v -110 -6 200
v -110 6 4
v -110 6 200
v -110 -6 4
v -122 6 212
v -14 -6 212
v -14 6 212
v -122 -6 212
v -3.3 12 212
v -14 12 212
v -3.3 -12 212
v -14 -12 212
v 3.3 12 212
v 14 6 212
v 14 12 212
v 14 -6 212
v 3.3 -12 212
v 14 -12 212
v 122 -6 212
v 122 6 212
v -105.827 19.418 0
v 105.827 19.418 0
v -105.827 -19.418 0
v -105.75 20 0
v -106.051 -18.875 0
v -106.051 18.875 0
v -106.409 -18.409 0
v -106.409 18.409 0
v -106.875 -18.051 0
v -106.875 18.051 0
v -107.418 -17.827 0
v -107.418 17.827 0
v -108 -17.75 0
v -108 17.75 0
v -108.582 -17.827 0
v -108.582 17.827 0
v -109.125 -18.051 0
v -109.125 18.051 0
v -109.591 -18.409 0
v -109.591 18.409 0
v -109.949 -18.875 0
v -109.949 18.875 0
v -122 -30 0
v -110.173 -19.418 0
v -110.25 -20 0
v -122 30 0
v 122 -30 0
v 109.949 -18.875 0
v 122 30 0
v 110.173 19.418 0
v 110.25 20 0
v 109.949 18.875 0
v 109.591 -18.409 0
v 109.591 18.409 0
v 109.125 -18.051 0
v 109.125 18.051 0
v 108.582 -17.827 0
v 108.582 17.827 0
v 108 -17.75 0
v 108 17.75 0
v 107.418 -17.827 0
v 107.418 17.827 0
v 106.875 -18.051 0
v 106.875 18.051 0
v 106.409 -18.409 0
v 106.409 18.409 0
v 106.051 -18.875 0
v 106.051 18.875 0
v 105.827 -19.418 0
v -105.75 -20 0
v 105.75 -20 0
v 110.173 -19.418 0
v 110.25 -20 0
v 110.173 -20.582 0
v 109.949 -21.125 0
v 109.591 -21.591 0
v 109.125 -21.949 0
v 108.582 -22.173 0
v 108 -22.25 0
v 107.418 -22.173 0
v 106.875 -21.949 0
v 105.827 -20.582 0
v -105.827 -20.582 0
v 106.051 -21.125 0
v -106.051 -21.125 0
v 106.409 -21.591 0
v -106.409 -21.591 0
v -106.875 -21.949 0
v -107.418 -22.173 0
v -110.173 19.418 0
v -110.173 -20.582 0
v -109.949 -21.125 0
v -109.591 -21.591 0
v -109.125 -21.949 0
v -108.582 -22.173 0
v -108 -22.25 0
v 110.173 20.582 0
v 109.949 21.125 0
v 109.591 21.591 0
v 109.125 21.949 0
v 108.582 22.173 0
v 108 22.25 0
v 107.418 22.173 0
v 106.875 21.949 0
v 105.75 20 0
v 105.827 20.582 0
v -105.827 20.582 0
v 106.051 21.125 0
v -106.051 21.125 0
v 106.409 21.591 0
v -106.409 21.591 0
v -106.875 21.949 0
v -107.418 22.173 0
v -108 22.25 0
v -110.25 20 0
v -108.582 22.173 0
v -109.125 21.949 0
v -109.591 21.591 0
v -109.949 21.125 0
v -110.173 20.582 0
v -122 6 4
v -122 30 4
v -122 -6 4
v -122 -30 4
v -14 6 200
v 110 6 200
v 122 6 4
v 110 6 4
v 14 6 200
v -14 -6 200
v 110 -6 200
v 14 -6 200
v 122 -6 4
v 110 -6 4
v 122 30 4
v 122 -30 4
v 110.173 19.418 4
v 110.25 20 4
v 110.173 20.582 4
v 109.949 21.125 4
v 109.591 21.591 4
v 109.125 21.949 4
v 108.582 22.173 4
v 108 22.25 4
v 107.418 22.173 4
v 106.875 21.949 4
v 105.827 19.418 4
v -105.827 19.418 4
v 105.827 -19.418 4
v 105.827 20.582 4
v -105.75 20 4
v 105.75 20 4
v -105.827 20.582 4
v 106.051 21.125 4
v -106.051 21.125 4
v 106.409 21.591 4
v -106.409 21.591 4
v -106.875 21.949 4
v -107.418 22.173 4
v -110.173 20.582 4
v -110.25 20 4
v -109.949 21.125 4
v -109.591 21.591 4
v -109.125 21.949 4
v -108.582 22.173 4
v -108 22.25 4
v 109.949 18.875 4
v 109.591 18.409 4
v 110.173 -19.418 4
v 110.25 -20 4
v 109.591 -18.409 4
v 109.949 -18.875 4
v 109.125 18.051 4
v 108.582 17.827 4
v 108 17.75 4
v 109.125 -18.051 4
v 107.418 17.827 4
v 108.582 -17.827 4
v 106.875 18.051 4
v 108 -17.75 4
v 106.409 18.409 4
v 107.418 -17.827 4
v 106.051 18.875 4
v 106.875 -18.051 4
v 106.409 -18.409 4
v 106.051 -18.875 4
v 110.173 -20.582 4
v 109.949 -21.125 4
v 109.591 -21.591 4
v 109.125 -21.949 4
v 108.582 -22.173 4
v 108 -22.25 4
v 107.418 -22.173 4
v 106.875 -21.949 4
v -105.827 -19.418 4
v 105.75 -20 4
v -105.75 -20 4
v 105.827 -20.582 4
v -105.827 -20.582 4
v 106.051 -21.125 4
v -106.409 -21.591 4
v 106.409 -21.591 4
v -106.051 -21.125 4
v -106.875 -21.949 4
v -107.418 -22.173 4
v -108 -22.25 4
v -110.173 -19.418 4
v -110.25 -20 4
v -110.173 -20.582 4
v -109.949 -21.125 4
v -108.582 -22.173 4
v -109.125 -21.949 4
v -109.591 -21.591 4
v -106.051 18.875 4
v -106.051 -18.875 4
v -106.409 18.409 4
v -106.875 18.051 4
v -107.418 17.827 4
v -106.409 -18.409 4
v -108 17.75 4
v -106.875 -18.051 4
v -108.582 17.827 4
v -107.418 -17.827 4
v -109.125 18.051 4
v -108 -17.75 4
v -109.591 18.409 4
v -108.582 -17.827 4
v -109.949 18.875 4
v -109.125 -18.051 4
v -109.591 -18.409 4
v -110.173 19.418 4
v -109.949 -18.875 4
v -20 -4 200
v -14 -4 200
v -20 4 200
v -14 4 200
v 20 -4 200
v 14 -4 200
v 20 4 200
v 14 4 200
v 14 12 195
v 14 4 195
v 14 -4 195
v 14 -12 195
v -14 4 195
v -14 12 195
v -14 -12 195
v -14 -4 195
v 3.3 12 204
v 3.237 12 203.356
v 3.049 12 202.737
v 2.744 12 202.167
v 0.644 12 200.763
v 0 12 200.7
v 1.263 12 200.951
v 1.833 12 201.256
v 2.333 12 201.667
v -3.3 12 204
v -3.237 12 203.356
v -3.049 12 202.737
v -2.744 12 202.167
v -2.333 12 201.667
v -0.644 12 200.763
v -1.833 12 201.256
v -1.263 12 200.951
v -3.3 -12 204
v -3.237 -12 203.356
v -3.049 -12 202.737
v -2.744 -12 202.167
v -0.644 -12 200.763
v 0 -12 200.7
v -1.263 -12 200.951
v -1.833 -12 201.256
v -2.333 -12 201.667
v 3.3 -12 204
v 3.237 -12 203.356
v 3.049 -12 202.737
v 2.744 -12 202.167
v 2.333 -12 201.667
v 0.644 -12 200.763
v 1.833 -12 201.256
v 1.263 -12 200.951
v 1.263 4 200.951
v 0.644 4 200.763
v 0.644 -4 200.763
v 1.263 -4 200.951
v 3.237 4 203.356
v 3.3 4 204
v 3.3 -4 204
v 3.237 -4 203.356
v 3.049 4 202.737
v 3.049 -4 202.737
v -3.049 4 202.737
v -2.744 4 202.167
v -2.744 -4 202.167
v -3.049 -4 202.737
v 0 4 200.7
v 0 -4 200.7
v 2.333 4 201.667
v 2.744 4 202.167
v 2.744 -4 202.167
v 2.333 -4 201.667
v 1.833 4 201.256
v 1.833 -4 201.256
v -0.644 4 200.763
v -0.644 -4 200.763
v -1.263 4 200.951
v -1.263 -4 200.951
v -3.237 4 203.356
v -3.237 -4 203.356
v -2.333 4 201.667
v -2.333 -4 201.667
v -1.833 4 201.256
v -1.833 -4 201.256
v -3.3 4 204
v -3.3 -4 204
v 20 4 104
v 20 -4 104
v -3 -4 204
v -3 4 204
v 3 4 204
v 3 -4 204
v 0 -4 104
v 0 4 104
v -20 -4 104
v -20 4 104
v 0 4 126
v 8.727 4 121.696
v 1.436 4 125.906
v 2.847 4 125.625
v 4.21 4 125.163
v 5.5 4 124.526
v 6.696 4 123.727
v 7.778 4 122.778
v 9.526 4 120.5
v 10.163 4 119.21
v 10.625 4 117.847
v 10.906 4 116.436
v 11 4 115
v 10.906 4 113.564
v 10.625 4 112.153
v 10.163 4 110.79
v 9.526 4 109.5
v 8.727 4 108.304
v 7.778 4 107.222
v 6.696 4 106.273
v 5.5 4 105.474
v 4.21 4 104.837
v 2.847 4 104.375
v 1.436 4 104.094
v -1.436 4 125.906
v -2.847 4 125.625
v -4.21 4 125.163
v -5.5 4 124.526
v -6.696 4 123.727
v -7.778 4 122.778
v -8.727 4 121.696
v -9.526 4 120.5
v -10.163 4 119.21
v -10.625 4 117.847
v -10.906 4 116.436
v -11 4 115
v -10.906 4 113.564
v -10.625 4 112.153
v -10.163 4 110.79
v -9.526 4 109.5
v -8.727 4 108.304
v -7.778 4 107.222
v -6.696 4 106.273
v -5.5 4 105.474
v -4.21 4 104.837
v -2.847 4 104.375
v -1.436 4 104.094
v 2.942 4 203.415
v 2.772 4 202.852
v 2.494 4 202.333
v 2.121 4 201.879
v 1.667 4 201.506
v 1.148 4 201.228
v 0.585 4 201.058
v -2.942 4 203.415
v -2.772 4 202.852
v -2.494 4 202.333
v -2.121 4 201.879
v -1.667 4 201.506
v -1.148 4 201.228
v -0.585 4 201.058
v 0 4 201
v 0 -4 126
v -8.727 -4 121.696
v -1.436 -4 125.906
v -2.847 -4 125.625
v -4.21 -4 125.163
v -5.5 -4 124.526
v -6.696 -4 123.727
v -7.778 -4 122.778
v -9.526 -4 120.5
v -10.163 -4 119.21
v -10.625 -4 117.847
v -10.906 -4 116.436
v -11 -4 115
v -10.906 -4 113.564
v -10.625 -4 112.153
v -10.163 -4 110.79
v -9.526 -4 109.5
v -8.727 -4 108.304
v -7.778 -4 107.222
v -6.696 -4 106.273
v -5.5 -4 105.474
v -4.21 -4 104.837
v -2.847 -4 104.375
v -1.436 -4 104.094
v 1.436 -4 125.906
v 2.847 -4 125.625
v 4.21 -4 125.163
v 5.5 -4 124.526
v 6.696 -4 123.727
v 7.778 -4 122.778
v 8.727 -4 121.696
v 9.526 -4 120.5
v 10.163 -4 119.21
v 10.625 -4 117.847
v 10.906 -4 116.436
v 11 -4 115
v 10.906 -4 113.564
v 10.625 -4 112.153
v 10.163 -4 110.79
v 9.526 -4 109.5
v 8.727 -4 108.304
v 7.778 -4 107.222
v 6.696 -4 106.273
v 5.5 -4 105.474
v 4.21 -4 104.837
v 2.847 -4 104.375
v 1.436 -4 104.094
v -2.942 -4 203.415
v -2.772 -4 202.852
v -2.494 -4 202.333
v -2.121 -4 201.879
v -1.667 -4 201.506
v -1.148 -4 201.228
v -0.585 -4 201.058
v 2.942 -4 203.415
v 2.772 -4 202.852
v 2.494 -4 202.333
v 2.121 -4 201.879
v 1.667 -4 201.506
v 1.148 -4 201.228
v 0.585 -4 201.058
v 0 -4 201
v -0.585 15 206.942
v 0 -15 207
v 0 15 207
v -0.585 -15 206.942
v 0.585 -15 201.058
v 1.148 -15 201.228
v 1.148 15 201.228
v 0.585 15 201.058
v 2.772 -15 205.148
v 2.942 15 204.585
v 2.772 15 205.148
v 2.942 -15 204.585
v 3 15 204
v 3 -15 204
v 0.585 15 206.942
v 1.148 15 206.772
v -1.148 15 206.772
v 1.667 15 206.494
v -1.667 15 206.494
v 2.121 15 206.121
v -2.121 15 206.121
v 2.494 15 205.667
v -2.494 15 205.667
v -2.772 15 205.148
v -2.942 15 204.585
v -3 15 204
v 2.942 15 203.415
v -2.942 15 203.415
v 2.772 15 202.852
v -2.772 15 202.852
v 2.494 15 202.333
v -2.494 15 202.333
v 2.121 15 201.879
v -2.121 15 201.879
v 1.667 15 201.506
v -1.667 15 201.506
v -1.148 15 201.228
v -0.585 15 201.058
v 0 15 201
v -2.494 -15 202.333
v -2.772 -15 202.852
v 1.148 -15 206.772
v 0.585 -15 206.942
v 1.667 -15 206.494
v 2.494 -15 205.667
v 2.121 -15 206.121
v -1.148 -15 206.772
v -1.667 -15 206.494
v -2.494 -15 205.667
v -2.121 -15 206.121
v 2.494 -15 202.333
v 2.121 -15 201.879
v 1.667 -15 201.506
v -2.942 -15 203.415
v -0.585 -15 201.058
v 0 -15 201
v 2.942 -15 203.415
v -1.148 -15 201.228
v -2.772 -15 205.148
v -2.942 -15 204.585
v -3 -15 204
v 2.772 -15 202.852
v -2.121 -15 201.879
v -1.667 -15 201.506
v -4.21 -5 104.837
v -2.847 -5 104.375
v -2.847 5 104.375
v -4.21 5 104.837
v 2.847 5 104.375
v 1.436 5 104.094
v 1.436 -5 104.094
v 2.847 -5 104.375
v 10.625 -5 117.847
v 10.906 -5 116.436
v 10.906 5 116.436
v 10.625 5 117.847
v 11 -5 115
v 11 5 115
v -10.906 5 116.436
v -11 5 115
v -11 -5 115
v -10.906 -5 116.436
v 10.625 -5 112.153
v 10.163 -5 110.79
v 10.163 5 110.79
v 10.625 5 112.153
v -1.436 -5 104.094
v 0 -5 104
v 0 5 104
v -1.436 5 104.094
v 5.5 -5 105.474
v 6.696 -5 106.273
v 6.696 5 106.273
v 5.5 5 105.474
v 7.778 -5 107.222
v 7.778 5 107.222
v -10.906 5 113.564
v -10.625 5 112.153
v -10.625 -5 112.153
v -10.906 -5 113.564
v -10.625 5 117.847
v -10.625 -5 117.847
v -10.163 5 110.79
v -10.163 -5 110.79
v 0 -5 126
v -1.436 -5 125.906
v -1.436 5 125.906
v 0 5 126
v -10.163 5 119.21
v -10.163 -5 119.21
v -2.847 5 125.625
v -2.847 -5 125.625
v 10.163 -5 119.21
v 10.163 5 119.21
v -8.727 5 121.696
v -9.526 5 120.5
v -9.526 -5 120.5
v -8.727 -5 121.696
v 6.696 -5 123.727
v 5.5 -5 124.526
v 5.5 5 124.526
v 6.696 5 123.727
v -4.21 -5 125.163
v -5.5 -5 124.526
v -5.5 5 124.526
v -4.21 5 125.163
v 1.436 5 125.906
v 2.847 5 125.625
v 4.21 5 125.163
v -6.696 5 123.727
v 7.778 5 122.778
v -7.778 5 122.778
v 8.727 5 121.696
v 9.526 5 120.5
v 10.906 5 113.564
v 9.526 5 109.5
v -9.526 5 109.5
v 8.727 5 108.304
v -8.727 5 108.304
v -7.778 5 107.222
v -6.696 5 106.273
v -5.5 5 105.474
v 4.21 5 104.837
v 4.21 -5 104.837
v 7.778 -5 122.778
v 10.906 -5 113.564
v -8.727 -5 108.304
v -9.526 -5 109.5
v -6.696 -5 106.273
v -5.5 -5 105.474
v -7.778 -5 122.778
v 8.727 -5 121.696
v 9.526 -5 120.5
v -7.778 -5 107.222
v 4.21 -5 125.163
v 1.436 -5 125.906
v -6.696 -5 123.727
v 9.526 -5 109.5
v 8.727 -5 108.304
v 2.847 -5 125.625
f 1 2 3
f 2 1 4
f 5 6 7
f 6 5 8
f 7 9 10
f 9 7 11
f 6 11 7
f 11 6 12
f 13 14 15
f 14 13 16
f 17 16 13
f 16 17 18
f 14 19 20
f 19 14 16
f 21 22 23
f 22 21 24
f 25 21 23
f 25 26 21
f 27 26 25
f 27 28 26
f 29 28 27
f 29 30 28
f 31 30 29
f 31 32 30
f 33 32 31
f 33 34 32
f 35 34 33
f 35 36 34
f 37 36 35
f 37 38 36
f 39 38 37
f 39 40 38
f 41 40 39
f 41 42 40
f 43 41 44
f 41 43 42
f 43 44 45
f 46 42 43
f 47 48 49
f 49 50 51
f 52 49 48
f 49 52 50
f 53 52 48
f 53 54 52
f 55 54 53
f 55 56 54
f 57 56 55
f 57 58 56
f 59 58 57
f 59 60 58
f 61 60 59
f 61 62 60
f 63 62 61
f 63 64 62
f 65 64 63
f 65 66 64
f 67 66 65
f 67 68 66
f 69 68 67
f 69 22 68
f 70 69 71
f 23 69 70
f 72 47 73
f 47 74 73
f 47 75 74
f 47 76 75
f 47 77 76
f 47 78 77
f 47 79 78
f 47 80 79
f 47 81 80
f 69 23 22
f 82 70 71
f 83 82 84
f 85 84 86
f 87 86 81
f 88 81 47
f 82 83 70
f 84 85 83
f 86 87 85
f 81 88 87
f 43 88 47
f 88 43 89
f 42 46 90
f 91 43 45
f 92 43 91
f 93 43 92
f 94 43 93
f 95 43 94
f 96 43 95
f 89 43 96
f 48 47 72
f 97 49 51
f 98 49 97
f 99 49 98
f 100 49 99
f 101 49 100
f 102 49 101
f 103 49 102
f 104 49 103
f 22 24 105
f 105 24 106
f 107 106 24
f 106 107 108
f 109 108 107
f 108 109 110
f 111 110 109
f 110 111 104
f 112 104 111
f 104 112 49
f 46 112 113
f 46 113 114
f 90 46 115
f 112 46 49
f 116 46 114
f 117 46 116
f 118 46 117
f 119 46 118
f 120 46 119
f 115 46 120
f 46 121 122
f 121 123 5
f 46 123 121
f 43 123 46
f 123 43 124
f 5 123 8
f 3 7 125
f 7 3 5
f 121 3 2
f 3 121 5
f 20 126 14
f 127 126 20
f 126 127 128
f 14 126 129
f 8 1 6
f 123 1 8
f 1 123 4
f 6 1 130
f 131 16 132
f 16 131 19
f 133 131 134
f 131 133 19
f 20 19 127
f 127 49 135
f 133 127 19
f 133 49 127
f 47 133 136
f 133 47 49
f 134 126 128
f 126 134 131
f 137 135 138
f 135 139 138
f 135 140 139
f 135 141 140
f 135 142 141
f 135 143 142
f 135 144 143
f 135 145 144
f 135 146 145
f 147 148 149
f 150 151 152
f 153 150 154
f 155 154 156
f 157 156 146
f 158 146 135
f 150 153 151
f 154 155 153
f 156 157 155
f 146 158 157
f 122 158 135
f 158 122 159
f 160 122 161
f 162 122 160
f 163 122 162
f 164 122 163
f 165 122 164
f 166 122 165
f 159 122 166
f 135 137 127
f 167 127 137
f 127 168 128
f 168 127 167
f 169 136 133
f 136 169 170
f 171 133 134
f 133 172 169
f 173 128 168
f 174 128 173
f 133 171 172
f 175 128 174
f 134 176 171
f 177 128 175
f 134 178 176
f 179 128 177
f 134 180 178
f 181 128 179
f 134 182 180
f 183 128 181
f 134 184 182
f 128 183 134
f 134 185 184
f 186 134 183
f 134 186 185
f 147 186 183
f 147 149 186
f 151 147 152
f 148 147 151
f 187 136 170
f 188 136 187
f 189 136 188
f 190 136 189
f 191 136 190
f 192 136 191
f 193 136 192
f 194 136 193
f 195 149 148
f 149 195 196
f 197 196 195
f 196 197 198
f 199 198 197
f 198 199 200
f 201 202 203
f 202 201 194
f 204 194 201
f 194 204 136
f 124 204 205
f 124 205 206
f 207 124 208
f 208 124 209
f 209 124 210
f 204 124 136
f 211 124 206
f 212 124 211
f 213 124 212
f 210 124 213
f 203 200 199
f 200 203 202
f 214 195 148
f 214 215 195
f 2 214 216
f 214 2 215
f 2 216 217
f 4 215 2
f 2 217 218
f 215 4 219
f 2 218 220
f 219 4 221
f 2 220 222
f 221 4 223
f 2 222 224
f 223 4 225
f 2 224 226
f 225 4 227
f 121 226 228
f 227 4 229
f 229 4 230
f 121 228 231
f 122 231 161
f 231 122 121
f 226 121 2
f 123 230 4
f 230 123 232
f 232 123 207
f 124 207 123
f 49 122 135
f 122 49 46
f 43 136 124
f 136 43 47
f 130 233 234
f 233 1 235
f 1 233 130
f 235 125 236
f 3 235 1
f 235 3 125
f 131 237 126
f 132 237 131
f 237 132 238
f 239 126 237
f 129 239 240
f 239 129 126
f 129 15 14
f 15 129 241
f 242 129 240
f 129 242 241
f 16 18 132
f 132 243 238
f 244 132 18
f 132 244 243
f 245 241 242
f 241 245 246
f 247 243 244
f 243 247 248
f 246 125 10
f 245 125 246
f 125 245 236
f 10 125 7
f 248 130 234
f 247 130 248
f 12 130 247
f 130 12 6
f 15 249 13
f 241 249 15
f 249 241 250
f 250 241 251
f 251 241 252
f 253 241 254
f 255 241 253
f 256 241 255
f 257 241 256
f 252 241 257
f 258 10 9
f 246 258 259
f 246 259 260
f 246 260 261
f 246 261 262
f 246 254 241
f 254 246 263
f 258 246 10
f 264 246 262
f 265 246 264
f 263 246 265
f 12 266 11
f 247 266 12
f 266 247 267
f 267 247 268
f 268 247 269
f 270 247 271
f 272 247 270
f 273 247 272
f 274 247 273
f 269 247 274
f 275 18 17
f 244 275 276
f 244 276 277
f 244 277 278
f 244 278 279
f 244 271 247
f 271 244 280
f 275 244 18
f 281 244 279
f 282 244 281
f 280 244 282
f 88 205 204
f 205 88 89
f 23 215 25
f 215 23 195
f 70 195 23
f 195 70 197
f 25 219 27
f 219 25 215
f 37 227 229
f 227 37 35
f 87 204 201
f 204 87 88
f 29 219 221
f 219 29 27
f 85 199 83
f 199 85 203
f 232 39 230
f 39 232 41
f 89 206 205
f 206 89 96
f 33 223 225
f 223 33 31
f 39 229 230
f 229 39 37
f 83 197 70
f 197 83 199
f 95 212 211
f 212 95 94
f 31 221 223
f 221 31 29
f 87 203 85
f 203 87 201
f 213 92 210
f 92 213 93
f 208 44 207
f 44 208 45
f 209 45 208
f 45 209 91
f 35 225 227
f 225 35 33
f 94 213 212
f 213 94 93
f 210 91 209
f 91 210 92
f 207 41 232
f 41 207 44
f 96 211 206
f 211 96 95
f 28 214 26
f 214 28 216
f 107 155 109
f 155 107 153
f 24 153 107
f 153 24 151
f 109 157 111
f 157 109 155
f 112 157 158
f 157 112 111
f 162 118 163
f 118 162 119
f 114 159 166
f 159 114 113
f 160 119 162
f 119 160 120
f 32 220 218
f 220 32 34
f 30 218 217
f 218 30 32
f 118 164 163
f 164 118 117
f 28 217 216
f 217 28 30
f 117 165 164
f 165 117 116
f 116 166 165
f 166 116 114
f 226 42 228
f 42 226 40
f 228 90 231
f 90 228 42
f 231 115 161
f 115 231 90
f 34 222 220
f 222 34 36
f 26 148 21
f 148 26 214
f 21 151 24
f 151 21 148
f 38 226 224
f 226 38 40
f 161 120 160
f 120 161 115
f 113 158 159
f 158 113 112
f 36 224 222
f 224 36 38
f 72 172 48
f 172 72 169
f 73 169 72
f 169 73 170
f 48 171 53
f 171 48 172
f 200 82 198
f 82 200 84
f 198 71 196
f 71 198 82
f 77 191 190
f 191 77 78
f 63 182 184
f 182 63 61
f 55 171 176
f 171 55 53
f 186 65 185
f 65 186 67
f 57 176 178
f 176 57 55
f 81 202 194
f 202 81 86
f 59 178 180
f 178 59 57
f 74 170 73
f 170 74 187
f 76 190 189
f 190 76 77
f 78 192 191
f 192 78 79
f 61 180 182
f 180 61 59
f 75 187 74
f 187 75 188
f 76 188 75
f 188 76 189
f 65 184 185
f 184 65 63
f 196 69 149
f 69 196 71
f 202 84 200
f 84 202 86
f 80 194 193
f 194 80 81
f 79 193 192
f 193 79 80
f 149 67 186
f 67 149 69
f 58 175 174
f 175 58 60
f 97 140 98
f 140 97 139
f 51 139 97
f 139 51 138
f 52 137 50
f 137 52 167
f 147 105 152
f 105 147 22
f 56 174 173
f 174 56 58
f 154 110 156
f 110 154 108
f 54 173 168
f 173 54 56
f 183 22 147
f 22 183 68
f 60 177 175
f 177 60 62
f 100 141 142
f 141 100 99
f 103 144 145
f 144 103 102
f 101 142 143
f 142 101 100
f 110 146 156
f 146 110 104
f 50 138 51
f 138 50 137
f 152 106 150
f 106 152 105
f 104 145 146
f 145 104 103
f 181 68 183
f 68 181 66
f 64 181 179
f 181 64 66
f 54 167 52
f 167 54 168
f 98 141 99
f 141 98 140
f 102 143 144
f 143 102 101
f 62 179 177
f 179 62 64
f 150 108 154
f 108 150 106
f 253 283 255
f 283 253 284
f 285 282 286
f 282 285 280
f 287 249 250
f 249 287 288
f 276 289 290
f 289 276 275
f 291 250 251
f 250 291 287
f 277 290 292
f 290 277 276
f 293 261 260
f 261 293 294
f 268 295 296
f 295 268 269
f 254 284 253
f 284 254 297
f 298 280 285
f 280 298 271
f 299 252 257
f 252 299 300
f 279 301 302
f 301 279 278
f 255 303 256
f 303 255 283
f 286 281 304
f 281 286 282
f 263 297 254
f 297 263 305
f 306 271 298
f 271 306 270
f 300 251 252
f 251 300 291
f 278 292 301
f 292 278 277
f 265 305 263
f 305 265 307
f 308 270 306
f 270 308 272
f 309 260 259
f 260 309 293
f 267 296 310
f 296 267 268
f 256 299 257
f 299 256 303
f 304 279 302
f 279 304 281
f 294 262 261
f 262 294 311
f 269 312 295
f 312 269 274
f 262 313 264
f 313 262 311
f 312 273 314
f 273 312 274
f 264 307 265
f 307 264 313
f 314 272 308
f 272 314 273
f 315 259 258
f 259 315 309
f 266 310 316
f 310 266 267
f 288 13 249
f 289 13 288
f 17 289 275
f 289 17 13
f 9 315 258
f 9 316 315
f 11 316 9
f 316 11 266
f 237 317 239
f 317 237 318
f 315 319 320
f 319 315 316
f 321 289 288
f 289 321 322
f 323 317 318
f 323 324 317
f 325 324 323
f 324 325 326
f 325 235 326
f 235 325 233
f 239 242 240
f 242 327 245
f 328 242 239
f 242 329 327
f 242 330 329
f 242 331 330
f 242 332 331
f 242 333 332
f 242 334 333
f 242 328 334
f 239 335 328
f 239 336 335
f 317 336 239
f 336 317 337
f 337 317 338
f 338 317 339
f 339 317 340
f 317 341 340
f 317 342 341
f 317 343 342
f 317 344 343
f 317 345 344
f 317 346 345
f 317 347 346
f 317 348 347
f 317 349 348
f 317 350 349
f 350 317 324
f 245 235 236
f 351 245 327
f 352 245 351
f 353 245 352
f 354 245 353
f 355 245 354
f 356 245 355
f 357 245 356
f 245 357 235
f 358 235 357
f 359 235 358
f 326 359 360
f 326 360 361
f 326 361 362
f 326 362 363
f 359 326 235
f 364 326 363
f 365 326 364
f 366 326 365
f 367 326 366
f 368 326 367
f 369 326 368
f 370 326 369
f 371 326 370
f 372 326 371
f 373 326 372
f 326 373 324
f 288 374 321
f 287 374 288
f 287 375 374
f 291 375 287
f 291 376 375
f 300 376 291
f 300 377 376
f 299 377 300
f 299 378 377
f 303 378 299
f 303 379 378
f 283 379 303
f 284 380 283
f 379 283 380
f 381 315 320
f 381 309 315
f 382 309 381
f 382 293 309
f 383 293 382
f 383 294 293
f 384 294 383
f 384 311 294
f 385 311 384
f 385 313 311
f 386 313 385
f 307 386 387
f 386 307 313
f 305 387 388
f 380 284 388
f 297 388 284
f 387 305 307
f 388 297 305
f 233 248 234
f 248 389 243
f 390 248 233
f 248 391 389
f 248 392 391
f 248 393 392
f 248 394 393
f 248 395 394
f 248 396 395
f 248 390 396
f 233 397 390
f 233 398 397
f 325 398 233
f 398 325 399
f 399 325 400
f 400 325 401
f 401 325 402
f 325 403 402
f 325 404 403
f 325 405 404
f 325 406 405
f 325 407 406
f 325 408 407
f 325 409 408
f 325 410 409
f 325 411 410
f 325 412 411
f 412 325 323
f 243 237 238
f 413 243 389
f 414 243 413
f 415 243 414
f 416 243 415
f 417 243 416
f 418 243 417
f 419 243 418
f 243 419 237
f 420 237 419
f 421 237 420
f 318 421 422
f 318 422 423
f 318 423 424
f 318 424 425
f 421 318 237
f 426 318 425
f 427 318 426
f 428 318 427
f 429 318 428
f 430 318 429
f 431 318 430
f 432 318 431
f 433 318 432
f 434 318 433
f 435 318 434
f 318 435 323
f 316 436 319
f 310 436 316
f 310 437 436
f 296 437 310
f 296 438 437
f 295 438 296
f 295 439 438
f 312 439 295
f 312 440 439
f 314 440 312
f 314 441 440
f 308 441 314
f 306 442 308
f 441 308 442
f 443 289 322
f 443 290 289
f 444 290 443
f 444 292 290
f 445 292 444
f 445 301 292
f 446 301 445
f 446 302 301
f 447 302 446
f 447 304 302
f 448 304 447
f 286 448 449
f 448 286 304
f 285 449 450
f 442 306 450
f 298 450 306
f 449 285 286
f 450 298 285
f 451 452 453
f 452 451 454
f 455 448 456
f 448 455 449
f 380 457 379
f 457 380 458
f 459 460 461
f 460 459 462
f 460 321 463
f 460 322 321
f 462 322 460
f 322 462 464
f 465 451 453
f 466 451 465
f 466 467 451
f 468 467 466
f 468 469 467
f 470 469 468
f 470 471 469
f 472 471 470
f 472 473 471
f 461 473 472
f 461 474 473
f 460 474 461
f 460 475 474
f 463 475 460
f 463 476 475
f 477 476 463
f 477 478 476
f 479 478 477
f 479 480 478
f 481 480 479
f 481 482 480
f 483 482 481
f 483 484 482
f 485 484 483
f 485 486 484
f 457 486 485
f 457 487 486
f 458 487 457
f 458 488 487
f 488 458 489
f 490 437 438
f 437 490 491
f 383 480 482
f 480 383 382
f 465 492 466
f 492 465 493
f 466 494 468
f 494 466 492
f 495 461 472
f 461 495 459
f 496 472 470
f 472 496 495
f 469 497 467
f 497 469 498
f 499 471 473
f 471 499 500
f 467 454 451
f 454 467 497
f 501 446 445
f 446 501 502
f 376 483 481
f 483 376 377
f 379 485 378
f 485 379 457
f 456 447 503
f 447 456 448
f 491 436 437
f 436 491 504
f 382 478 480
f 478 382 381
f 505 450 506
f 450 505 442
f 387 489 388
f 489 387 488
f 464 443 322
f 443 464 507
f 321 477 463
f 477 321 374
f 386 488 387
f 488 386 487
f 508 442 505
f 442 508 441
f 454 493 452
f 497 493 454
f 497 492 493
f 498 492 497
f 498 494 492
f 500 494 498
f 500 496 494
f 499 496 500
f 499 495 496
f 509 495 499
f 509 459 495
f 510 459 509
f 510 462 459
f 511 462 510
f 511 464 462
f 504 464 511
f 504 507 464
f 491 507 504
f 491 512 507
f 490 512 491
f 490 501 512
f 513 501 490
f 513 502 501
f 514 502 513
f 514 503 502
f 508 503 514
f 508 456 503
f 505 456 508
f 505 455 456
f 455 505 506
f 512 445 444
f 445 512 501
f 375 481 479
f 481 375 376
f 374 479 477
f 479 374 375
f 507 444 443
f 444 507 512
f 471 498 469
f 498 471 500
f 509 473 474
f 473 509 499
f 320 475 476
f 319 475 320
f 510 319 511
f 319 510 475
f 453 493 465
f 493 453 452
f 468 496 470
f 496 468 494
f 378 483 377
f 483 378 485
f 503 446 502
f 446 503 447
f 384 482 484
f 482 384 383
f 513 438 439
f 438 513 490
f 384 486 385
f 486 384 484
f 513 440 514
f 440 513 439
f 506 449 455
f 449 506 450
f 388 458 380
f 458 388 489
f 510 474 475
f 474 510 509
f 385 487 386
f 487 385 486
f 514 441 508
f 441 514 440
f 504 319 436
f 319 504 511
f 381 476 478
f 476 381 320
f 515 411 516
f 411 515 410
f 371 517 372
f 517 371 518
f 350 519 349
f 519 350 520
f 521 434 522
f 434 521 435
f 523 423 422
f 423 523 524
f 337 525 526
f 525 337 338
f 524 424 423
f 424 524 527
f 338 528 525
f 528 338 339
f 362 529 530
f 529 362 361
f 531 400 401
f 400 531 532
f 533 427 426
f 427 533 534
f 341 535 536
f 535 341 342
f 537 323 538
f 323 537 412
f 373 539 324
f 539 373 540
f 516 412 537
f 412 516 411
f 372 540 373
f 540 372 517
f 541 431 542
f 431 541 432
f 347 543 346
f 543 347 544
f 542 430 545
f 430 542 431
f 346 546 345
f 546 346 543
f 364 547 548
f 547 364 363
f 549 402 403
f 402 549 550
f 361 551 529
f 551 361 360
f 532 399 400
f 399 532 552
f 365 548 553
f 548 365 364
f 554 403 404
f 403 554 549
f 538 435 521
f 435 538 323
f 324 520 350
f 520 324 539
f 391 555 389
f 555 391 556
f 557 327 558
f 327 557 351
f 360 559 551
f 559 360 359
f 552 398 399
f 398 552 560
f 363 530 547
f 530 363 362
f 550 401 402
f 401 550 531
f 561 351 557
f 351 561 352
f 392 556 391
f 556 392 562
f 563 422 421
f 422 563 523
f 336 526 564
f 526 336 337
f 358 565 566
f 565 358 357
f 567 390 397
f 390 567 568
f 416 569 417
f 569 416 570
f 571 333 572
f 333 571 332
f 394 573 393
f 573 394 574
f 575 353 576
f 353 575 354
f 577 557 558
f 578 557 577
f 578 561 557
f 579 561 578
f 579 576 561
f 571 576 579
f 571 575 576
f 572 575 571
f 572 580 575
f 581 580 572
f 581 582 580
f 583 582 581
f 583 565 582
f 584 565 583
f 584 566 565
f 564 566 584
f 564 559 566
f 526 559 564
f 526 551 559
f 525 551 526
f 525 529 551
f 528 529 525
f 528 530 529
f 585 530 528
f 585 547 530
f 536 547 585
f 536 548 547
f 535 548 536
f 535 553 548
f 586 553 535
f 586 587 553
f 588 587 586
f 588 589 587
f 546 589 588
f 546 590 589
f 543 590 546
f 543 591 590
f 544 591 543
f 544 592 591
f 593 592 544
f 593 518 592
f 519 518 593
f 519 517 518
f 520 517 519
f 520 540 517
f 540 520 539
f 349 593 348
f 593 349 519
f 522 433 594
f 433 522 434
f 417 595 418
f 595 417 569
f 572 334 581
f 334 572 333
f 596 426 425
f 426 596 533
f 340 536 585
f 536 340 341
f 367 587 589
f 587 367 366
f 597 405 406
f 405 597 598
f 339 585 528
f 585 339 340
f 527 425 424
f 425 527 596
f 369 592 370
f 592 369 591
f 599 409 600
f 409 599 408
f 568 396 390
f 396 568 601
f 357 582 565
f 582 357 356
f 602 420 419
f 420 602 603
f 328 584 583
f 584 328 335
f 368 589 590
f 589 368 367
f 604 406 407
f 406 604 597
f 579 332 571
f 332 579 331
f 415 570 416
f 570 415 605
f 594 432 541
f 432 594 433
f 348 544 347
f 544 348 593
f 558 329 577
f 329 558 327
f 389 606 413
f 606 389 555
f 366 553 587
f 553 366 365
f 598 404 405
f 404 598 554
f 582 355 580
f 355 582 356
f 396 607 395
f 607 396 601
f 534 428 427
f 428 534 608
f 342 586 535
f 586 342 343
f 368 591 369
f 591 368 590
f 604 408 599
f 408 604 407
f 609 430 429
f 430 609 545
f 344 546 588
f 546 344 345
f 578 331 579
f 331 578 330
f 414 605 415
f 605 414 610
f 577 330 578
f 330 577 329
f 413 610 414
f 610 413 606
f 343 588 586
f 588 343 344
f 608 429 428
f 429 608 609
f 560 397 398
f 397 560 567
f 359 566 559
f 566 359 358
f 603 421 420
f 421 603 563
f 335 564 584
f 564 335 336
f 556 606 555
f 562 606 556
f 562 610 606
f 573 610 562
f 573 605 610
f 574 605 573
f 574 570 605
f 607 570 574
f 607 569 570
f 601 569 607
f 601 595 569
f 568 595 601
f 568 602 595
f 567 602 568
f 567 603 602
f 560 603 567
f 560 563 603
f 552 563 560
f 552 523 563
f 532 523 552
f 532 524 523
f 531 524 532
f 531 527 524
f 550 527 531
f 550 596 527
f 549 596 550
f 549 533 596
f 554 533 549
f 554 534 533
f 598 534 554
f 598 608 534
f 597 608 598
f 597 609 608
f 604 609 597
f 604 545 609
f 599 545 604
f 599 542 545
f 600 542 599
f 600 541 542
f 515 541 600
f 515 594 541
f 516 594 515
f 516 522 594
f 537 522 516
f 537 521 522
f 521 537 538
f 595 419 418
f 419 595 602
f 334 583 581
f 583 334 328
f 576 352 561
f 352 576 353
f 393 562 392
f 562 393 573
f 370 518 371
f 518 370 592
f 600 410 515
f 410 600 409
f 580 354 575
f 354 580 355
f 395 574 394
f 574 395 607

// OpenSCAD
// file: ../models/drone-playground-pendulum-paddle/model.scad
paddle_width=40; paddle_height=100; paddle_thickness=8; axle_diameter=6; axle_length=30;
module pendulum_paddle(){ union(){ translate([-paddle_width/2,-paddle_thickness/2,0]) cube([paddle_width,paddle_thickness,paddle_height]); translate([0,0,paddle_height]) rotate([90,0,0]) cylinder(d=axle_diameter,h=axle_length,center=true,$fn=32); translate([0,0,11]) rotate([90,0,0]) cylinder(d=22,h=paddle_thickness+2,center=true,$fn=48); }}
assert(paddle_width==40 && paddle_height==100 && axle_diameter==6); echo("SCADCTL_REQUIREMENT:parameters:PASS"); pendulum_paddle();
// file: ../models/drone-playground-pendulum-gantry/model.scad
clear_width=220; clear_height=200; frame_bar=12; base_depth=60; mount_hole_diameter=4.5; axle_bore=6.6;
module pendulum_gantry(){ difference(){ union(){ translate([-(clear_width+2*frame_bar)/2,-base_depth/2,0]) cube([clear_width+2*frame_bar,base_depth,4]); for(x=[-clear_width/2-frame_bar,clear_width/2]) translate([x,-frame_bar/2,0]) cube([frame_bar,frame_bar,clear_height+frame_bar]); translate([-clear_width/2-frame_bar,-frame_bar/2,clear_height]) cube([clear_width+2*frame_bar,frame_bar,frame_bar]); translate([-14,-12,clear_height-5]) cube([28,24,17]); } translate([0,0,clear_height+4]) rotate([90,0,0]) cylinder(d=axle_bore,h=30,center=true,$fn=32); translate([-axle_bore/2,-16,clear_height+4]) cube([axle_bore,32,16]); for(x=[-108,108],y=[-20,20]) translate([x,y,-1]) cylinder(d=mount_hole_diameter,h=7,$fn=24); }}
assert(clear_width==220 && clear_height==200); echo("SCADCTL_REQUIREMENT:parameters:PASS"); pendulum_gantry();
// main file
use <../models/drone-playground-pendulum-gantry/model.scad>
use <../models/drone-playground-pendulum-paddle/model.scad>
color("dodgerblue") pendulum_gantry();
color("orange") translate([0,0,104]) pendulum_paddle();
